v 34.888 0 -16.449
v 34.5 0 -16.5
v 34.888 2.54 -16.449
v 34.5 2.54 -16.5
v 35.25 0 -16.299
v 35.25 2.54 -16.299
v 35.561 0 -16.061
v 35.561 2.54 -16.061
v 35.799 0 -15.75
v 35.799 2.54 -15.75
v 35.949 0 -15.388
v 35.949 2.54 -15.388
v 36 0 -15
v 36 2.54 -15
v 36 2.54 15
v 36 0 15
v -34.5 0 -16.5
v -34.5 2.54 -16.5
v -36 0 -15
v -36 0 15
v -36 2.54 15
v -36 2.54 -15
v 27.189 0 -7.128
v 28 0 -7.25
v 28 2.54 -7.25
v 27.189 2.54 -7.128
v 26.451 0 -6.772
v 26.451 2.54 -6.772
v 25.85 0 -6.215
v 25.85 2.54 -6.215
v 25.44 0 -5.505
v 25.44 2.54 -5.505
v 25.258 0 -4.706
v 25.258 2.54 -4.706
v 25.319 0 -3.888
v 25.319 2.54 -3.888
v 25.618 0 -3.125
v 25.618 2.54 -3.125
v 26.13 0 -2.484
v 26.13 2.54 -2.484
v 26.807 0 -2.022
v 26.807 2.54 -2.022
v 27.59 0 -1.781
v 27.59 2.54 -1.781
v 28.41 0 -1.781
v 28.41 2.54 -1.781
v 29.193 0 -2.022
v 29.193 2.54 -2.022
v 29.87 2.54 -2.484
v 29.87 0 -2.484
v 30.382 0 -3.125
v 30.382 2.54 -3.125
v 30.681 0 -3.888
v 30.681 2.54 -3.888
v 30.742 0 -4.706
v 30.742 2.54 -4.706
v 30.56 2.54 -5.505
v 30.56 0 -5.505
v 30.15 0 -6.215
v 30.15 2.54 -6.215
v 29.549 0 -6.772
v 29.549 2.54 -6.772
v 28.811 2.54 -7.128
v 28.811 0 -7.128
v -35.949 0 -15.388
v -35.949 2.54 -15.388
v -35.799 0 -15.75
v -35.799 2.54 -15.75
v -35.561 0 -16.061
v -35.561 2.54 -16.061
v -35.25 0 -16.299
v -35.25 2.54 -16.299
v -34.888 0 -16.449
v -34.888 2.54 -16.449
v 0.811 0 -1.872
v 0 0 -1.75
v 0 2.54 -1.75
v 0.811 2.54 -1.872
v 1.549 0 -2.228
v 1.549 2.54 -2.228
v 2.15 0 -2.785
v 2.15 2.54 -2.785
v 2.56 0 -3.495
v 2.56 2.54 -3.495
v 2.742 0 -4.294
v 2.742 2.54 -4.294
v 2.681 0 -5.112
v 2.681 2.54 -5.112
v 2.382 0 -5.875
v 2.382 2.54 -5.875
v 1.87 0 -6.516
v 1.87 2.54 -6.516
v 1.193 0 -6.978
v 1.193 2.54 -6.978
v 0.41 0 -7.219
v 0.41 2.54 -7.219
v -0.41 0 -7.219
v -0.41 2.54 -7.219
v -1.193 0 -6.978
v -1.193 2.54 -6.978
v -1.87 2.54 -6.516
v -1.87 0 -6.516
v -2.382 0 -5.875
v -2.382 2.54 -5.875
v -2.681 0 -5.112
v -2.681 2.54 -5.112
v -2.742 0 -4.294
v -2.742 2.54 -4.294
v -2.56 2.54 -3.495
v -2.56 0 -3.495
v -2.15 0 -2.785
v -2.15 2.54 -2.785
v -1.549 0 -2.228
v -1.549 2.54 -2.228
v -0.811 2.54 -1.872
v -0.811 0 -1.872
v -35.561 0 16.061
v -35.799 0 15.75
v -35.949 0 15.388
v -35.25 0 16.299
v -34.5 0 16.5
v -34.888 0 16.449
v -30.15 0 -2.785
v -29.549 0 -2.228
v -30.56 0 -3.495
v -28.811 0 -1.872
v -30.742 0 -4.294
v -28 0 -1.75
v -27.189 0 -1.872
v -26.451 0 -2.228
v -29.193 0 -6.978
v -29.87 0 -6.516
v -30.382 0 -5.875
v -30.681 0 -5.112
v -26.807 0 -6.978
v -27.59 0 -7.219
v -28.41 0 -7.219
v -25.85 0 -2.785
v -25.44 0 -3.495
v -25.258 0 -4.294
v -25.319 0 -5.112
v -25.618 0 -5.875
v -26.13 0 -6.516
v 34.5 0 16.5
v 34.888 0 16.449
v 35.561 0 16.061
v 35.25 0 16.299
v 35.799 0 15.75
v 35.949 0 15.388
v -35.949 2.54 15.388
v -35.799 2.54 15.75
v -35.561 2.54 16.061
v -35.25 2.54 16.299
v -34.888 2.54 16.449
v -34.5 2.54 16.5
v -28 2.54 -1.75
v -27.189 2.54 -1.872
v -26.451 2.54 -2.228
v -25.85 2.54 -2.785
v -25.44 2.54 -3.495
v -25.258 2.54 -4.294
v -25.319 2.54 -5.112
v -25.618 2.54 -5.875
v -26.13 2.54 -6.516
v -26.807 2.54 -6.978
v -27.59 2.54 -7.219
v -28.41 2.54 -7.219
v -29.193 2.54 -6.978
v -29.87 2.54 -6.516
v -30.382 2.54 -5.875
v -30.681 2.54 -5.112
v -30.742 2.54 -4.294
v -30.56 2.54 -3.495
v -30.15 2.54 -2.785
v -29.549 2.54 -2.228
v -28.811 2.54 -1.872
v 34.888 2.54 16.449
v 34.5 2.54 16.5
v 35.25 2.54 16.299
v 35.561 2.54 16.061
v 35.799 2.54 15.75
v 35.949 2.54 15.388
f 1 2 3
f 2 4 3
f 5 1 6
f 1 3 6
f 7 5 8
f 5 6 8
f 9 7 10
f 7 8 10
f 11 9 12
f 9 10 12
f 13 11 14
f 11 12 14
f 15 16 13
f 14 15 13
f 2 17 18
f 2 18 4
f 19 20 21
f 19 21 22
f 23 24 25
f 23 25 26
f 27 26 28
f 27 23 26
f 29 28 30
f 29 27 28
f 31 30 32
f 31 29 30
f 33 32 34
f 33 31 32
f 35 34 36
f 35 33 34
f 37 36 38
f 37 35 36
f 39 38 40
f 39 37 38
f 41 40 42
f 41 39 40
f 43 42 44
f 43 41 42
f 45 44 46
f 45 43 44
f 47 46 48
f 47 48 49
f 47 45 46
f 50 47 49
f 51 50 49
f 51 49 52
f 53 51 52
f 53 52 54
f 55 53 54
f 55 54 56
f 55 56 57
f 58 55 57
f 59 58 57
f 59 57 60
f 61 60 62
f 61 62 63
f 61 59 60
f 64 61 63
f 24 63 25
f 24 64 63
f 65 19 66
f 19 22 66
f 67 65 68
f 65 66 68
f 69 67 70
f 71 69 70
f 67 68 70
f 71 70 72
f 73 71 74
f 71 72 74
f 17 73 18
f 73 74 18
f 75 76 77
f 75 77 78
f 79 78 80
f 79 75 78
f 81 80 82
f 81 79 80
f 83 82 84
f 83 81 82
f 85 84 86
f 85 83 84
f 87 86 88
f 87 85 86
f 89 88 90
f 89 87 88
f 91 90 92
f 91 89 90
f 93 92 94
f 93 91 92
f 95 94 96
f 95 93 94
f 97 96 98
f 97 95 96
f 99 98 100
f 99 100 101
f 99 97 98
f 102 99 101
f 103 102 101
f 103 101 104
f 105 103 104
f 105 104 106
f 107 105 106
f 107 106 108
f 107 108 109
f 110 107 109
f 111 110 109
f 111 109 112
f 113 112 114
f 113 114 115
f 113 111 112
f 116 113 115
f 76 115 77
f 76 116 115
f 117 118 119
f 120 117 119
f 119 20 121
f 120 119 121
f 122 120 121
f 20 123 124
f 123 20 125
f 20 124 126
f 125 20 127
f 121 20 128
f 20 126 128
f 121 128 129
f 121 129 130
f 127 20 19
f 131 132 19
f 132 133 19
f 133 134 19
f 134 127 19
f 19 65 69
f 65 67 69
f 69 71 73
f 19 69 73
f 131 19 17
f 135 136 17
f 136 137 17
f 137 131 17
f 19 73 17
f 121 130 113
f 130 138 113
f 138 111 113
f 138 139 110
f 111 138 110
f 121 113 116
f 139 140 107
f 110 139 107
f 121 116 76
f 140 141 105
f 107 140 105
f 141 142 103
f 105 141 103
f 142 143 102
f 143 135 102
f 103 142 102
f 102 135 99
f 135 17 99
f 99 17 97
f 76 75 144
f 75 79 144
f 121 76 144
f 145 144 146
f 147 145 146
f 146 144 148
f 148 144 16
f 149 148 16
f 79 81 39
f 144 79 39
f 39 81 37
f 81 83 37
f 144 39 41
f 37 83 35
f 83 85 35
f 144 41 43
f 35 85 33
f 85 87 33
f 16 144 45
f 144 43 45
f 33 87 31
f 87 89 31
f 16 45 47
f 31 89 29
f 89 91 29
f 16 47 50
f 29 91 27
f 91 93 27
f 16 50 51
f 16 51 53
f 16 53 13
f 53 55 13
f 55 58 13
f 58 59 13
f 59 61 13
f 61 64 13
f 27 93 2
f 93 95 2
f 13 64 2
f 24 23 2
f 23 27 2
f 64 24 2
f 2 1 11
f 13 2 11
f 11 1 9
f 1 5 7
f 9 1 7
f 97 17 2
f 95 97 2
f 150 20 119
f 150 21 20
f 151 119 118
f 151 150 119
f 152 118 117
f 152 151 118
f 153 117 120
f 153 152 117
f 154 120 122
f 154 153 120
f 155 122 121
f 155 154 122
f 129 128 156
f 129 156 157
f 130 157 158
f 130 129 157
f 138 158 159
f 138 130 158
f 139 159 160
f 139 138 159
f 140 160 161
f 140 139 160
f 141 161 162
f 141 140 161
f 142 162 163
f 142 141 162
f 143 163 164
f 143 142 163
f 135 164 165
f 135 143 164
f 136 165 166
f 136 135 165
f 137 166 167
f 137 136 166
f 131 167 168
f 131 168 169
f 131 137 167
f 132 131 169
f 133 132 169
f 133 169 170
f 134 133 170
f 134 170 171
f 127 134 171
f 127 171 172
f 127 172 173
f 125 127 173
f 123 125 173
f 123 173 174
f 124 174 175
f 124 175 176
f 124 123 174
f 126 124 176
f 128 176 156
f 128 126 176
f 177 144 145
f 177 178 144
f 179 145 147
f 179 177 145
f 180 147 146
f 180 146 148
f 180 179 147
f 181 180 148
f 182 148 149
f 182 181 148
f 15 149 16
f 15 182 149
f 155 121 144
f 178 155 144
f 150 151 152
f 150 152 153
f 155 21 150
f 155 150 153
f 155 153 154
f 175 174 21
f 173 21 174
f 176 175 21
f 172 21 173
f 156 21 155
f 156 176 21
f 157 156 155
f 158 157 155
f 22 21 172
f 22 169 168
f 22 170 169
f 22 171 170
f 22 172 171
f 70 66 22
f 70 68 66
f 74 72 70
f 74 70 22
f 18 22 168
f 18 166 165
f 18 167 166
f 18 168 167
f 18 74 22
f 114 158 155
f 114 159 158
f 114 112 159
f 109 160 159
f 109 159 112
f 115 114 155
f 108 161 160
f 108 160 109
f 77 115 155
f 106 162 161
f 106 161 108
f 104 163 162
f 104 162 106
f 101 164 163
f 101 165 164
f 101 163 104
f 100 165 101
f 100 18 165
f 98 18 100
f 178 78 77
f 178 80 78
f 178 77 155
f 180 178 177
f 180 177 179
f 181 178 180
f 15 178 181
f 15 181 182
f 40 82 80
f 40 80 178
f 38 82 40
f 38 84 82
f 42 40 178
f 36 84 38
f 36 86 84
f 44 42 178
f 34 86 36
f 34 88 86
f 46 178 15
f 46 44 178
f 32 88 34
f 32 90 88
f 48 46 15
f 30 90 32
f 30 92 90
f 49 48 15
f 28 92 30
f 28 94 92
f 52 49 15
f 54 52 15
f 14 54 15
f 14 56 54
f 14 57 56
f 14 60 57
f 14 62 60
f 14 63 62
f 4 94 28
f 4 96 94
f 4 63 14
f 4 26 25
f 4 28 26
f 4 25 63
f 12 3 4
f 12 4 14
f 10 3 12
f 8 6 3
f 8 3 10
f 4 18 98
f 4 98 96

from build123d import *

# Parameters (mm, degrees)
SKETCH1_W           = 72
SKETCH1_H           = 33
SKETCH1_R           = 2.75
BOSS_EXTRUDE1_DEPTH = 2.54
FILLET1_R           = 1.5


with BuildPart() as part:
    # Sketch1 → Boss-Extrude1 (new body)
    with BuildSketch(Plane(origin=(0, 0, 0), x_dir=(1, 0, 0), z_dir=(0, 1, 0))):
        Rectangle(SKETCH1_W, SKETCH1_H)
        with Locations((-28, 4.5)):
            Circle(SKETCH1_R, mode=Mode.SUBTRACT)
        with Locations((0, 4.5)):
            Circle(SKETCH1_R, mode=Mode.SUBTRACT)
        with Locations((28, 4.5)):
            Circle(SKETCH1_R, mode=Mode.SUBTRACT)
    extrude(amount=BOSS_EXTRUDE1_DEPTH)

    # Fillet1
    fillet1_edges = [part.edges().sort_by_distance(p)[0] for p in [
        (-36, 1.27, -16.5),
        (36, 1.27, -16.5),
        (36, 1.27, 16.5),
        (-36, 1.27, 16.5),
    ]]
    fillet(fillet1_edges, radius=FILLET1_R)


solid = part.part
